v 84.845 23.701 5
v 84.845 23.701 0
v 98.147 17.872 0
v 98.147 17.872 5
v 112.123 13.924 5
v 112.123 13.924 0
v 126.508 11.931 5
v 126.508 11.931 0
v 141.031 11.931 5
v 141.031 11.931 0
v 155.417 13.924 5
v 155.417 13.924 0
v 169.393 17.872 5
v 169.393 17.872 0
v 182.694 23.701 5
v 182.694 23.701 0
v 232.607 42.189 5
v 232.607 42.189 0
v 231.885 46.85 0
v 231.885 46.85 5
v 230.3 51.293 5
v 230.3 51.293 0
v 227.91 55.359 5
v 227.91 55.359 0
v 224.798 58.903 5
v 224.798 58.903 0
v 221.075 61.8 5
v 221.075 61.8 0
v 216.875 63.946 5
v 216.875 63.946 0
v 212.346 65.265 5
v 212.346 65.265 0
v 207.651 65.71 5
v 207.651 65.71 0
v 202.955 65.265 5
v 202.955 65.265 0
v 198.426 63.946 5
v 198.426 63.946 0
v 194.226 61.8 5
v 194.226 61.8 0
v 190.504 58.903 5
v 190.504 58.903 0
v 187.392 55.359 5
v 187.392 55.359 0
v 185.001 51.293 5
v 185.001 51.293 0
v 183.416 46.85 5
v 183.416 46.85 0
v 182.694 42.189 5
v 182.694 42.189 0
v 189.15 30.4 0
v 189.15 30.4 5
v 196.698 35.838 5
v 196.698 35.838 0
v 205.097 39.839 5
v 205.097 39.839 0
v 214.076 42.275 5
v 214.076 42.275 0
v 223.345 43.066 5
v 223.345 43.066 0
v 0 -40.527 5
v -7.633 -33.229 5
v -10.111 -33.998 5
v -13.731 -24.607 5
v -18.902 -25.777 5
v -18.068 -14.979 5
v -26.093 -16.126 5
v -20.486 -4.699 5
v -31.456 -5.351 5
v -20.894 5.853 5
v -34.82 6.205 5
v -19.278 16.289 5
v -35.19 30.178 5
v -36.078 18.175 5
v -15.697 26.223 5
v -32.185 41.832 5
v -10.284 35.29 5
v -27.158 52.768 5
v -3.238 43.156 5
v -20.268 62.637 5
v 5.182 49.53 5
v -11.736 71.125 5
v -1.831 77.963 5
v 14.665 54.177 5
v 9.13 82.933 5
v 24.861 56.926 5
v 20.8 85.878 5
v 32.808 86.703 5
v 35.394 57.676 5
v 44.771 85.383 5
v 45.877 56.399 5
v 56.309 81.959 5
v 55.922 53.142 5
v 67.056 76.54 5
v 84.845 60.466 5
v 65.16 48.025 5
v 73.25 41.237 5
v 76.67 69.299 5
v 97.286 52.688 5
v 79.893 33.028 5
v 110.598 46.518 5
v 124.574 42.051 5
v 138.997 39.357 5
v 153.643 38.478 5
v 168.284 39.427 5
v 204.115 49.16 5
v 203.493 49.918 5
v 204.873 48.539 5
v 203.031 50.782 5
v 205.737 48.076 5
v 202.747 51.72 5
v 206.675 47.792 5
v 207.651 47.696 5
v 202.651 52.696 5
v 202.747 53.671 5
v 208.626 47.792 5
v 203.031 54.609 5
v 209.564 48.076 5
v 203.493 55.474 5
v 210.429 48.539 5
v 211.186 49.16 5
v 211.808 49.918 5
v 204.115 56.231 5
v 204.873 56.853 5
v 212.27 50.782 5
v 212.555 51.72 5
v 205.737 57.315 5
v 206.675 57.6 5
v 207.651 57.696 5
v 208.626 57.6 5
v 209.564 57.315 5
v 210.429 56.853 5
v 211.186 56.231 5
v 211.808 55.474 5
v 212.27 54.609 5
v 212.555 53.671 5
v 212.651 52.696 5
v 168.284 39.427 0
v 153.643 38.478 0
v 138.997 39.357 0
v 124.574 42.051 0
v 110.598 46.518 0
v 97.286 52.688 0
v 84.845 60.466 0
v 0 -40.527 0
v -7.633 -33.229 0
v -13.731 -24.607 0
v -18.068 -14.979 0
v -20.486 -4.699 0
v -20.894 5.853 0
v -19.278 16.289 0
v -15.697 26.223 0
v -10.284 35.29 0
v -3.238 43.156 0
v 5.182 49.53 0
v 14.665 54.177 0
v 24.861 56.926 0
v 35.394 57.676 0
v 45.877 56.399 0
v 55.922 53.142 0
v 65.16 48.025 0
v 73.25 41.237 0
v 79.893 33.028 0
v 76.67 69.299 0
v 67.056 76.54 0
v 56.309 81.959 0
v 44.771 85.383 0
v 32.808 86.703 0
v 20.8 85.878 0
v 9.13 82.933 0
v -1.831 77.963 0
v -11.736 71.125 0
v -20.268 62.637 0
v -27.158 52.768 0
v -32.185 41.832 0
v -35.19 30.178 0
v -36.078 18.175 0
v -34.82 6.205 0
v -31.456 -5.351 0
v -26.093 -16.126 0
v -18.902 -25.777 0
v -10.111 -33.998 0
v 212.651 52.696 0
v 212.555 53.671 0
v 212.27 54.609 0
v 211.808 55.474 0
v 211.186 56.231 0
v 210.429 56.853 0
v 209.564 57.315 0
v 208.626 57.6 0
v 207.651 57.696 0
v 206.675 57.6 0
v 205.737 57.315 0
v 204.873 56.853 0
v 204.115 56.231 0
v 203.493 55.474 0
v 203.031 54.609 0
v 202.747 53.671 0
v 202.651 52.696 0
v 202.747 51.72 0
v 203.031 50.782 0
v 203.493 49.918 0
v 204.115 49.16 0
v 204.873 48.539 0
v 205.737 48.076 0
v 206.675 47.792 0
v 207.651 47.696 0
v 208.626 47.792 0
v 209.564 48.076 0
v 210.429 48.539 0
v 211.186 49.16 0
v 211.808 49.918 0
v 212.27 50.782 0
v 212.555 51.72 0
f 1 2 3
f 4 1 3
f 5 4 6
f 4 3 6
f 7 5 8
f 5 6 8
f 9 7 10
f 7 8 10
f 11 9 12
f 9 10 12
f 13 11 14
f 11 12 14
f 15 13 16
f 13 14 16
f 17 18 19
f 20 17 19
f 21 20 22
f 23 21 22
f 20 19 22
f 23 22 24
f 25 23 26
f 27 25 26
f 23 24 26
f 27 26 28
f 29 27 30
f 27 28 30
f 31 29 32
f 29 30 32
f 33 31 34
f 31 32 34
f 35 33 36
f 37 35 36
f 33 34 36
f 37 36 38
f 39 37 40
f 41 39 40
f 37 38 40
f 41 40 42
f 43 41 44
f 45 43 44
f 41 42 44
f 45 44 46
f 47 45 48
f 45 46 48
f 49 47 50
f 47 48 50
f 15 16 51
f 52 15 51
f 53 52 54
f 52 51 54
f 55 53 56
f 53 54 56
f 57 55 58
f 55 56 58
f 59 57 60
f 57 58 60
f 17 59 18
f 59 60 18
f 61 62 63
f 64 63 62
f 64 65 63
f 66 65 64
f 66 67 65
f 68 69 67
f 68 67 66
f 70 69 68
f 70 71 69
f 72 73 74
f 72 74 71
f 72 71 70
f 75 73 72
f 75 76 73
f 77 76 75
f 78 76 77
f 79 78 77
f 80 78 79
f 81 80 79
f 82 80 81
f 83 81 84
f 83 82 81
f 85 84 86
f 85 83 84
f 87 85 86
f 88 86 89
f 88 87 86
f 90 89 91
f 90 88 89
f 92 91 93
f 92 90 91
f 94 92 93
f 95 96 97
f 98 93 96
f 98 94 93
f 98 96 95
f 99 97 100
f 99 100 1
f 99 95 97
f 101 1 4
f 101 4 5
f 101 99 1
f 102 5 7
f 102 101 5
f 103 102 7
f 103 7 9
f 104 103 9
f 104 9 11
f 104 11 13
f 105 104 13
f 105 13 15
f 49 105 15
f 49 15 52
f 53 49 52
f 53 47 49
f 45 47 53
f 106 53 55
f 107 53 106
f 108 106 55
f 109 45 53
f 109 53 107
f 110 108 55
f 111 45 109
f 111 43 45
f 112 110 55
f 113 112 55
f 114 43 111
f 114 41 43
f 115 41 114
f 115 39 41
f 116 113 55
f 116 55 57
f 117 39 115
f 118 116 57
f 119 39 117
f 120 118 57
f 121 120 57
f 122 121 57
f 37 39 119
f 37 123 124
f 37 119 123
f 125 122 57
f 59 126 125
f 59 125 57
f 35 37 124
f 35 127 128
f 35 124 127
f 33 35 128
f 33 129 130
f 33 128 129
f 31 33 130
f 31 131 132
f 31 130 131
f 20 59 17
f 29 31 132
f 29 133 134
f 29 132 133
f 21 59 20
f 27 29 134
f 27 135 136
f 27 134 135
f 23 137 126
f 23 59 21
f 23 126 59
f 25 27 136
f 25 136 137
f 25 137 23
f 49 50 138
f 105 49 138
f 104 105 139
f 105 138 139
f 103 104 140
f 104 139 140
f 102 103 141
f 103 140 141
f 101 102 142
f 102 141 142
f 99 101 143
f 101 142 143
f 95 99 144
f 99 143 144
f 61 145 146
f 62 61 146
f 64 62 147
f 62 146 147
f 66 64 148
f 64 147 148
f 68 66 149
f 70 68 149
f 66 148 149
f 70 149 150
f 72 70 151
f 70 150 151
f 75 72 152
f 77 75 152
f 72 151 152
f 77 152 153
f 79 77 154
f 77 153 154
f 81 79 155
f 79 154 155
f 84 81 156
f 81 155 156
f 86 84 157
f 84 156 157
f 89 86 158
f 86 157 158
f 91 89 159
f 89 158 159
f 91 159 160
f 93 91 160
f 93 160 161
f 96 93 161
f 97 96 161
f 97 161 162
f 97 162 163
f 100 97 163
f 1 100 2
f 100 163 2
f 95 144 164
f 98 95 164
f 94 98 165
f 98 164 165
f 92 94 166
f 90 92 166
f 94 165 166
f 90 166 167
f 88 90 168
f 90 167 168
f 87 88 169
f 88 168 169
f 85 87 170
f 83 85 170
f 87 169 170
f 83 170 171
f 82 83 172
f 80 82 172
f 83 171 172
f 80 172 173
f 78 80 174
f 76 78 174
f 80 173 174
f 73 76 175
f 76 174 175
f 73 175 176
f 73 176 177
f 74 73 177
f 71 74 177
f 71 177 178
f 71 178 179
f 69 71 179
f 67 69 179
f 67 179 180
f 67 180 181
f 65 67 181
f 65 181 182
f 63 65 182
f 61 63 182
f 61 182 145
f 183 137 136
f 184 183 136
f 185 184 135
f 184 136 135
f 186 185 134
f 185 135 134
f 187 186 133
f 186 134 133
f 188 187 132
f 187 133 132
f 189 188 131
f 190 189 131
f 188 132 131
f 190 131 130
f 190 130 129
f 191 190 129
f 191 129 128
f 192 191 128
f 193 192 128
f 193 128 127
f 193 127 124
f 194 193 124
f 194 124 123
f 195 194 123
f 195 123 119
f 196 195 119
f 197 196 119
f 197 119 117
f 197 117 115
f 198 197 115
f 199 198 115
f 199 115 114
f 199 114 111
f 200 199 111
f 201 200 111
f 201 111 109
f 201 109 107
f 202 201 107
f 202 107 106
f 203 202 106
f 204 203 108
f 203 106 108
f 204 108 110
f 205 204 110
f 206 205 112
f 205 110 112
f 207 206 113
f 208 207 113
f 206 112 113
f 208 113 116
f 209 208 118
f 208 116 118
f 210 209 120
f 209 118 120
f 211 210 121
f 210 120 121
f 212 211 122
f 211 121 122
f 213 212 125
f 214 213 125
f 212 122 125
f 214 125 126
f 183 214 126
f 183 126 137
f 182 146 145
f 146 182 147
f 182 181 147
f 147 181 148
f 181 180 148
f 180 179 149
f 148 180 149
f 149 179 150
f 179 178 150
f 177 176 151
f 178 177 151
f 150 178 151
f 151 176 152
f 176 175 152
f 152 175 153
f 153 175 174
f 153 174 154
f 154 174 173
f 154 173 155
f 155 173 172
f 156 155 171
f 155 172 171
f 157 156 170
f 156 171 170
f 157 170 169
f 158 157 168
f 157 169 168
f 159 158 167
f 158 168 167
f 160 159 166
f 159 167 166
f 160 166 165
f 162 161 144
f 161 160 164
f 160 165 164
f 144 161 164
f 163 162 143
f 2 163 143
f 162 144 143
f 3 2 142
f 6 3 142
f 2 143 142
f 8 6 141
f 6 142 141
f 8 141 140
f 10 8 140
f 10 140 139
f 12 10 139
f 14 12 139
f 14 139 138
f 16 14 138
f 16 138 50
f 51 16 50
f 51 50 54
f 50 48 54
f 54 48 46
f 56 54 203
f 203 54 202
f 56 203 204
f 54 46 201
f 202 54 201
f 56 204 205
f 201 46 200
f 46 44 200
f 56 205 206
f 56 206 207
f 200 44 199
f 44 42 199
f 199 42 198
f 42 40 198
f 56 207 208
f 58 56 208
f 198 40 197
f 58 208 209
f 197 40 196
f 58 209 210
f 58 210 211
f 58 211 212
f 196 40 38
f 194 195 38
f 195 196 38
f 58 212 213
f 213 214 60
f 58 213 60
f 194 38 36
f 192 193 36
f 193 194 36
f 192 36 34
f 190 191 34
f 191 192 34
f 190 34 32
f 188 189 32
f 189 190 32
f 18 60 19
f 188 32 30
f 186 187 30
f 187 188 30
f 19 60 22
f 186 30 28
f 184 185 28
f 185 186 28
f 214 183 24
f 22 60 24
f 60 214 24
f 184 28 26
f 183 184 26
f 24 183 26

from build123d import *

# Parameters (mm, degrees)
F1_DEPTH = 5
F2_R     = 5
F3_DEPTH = 389
F4_R     = 5
F5_DEPTH = 5.001


# Not quite as in the source:
# - an extrude ends at something that could not be found from the text; its depth is read off the source's solid


with BuildPart() as f1:
    # F0 (on Top) → F1 (new body)
    with BuildSketch(Plane.XY):
        with BuildLine():
            ThreePointArc((182.6944426466, 42.1886855807), (131.7434290728, 40.4795108007), (84.8448510232, 60.4657670673))
            ThreePointArc((84.8448510232, 60.4657670673), (-20.2682643936, 62.6366103984), (0, -40.5267409035))
            ThreePointArc((0, -40.5267409035), (0.8188047448, 46.5454009095), (84.8448510232, 23.7013236039))
            ThreePointArc((84.8448510232, 23.7013236039), (133.7696468349, 11.680757797), (182.6944426466, 23.7013236039))
            ThreePointArc((182.6944426466, 23.7013236039), (205.0971207079, 39.8391466865), (232.6069186924, 42.1886855807))
            ThreePointArc((232.6069186924, 42.1886855807), (207.6506806695, 65.7101106777), (182.6944426466, 42.1886855807))
        make_face()
    extrude(amount=F1_DEPTH)

    # F2 (on Top) → F3 (cut, through all)
    with BuildSketch(Plane.XY):
        with Locations((210.5412267722, 54.1418395773)):
            Circle(F2_R)
    extrude(amount=-F3_DEPTH, mode=Mode.SUBTRACT)

    # F4 (on face) → F5 (cut, through all)
    with BuildSketch(Plane.XY.offset(5)):
        with Locations((207.6506806695, 52.6958927512)):
            Circle(F4_R)
    extrude(amount=-F5_DEPTH, mode=Mode.SUBTRACT)


solid = f1.part
